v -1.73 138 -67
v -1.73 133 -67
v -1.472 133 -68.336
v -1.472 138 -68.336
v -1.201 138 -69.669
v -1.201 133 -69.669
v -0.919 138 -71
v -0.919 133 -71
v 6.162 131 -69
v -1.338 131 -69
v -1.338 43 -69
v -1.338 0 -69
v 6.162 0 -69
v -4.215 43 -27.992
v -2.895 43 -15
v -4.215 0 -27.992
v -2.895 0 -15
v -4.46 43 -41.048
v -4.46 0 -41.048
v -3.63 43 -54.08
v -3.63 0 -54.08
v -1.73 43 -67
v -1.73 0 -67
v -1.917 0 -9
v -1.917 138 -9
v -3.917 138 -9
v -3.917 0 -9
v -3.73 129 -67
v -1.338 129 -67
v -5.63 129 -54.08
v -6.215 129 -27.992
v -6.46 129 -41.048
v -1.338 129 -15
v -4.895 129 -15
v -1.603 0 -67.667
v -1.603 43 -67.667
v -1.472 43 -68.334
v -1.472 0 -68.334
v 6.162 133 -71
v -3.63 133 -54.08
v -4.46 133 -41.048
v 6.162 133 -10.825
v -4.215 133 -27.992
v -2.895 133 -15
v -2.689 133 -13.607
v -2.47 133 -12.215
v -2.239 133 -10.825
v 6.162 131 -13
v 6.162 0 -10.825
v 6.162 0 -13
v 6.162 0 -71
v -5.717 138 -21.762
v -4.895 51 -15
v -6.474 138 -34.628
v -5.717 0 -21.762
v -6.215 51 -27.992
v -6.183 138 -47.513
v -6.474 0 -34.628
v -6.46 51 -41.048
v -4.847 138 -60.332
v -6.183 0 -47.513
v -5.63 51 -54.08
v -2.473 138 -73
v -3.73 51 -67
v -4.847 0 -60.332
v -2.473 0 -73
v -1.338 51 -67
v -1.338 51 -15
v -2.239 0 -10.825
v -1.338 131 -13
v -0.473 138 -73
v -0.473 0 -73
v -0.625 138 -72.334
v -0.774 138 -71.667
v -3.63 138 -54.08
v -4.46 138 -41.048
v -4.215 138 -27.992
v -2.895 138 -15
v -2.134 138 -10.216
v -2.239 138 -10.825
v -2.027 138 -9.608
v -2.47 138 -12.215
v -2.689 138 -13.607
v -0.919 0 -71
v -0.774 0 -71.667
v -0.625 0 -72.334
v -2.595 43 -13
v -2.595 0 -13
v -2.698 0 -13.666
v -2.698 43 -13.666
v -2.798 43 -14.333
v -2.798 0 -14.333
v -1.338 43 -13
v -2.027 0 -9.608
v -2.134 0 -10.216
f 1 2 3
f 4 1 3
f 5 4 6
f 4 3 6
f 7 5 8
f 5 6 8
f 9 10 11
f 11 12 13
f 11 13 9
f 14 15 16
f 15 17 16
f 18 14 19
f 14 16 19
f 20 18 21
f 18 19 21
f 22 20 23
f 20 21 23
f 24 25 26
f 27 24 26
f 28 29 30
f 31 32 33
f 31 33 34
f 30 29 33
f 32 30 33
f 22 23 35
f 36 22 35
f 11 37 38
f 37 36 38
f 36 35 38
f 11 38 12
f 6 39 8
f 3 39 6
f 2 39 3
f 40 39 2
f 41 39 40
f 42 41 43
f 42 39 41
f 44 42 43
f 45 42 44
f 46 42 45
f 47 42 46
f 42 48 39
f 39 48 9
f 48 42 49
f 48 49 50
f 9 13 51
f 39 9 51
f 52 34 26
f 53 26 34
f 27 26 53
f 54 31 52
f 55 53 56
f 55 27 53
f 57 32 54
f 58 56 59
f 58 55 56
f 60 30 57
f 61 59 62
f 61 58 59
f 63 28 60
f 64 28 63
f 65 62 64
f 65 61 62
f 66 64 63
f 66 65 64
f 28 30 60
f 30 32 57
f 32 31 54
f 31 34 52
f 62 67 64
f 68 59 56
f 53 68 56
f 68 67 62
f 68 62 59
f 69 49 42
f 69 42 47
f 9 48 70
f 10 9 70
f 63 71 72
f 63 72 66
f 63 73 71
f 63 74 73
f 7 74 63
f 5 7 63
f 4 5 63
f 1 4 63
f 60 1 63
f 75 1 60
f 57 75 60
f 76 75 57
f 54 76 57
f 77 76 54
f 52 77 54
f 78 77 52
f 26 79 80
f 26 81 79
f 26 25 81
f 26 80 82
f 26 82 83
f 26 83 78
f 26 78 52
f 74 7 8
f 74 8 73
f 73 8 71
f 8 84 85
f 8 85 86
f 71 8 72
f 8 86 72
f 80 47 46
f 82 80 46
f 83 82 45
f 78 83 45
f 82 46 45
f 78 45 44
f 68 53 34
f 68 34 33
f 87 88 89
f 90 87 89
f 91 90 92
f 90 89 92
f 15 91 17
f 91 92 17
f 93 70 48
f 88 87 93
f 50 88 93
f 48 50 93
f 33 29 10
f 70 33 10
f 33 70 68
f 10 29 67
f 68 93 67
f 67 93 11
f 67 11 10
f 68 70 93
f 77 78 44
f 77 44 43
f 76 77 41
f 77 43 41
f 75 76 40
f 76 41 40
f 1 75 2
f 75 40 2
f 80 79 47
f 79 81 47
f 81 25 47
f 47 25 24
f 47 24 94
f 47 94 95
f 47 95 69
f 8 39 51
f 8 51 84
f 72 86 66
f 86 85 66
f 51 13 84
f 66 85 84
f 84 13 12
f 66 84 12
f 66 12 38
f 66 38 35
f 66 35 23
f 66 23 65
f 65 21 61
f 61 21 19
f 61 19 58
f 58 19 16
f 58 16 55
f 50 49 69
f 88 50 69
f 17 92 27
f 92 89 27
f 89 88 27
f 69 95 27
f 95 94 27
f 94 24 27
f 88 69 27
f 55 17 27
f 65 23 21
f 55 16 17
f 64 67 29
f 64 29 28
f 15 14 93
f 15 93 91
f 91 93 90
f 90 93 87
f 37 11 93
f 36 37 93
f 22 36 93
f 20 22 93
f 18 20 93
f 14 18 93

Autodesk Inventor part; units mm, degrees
ref_plane "YZ Plane" through (0, 0, 0) normal (1, 0, 0) x (0, 1, 0)
ref_plane "XZ Plane" through (0, 0, 0) normal (0, 1, 0) x (-1, 0, 0)
ref_plane "XY Plane" through (0, 0, 0) normal (0, 0, 1) x (1, 0, 0)
sketch "Sketch1" plane through (0, 0, 0) normal (0, 1, 0) x (-1, 0, 0)
  line L0 (0, -37.5) -> (4.5, -37.5) construction
  line L1 (0, 0) -> (2, 0) construction
  line L2 (4.5, -37.5) -> (6.5, -37.5) construction
  line L3 (0, -75) -> (2, -75) construction
  arc A0 (2.4733, -73) -> (3.9166, -9) centre (-152, -37.5) ccw
  line L4 (1.9166, -9) -> (3.9166, -9)
  line L5 (0, -73) -> (2.4733, -73)
  line L6 (0, -15) -> (2.8949, -15) construction
  line L7 (0, -67) -> (1.7305, -67) construction
  line L8 (0, -69) -> (1.3383, -69) construction
  line L9 (1.3383, -69) -> (1.3383, -67)
  line L10 (1.3383, -67) -> (1.7305, -67)
  arc A1 (2.2393, -10.8253) -> (1.9166, -9) centre (-154, -37.5) ccw
  arc A2 (0.4733, -73) -> (0.9193, -71) centre (-154, -37.5) ccw
  arc A3 (1.7305, -67) -> (2.8949, -15) centre (-154, -37.5) ccw
  line L11 (-6.1617, -13) -> (-6.1617, -11)
  line L12 (-6.1617, -11) -> (-6.1617, -10.8253)
  line L13 (-6.1617, -10.8253) -> (2.2393, -10.8253)
  line L14 (1.3383, -67) -> (1.3383, -5.3327) construction
  line L15 (2.8949, -15) -> (1.3383, -15) construction
  line L16 (2.8949, -15) -> (1.3383, -15)
  line L17 (1.3383, -15) -> (1.3383, -13)
  line L18 (1.3383, -13) -> (-6.1617, -13)
  line L19 (1.3383, -69) -> (-6.1617, -69)
  line L20 (-6.1617, -69) -> (-6.1617, -71)
  line L21 (-6.1617, -71) -> (0.9193, -71)
  arc A4 (2.8949, -15) -> (2.2393, -10.8253) centre (-154, -37.5) ccw
  line L22 (1.3383, -13) -> (2.595, -13)
  arc A5 (0.9193, -71) -> (1.7305, -67) centre (-154, -37.5) ccw
  line L23 (1.3383, -15) -> (1.3383, -67)
  line L24 (-6.1617, -13) -> (-6.1617, -69)
  line L25 (2.8949, -15) -> (4.8949, -15)
  line L26 (1.7305, -67) -> (3.7305, -67)
  point P0 (0, -7)
  point P1 (2, 0)
  point P2 (0, -9)
  point P3 (0, -41)
  point P4 (0, -13)
  dimension "d14" = 75
  dimension "d15" = 4.5
  dimension "d16" = 68
  dimension "d17" = 2
  dimension "d18" = 2
  dimension "d19" = 2
  dimension "d20" = 2
  dimension "d21" = 2
  dimension "d22" = 32
  dimension "d23" = 26
  dimension "d24" = 26
  dimension "d26" = 28
  dimension "d27" = 28
  dimension "d29" = 2
  dimension "d30" = 7.5
  dimension "d31" = 7.5
  dimension "d32" = 2
extrude "Extrusion1" add sketch "Sketch1" along normal blind 138 contours L5 A2 A5 L26 A0 | L26 A3 L25 A0 | L25 A4 A1 L4 A0
extrude "Extrusion2" add sketch "Sketch1" along normal blind 133 contours A5 L9 L10 | L10 L23 L16 A3 | L21 L20 L19 A5 | L16 L17 L22 A4 | L9 L19 L24 L18 L17 L23 | L22 L18 L11 L12 L13 A4
extrude "Extrusion3" cut sketch "Sketch1" along normal blind 131 contours L10 L23 L16 A3 | L9 L19 L24 L18 L17 L23
extrude "Extrusion4" cut sketch "Sketch1" along normal blind 129 contours L26 A3 L25 A0
extrude "Extrusion5" add sketch "Sketch1" along normal blind 131 contours L10 L23 L16 A3
extrude "Extrusion6" cut sketch "Sketch1" along normal blind 129 contours L10 L23 L16 A3
extrude "Extrusion7" add sketch "Sketch1" along normal blind 51 contours L26 A3 L25 A0
extrude "Extrusion8" add sketch "Sketch1" along normal blind 51 contours L10 L23 L16 A3
extrude "Extrusion9" cut sketch "Sketch1" along normal blind 43 contours A5 L9 L10 | L10 L23 L16 A3 | L16 L17 L22 A4 | L9 L19 L24 L18 L17 L23
properties part number "facet"
